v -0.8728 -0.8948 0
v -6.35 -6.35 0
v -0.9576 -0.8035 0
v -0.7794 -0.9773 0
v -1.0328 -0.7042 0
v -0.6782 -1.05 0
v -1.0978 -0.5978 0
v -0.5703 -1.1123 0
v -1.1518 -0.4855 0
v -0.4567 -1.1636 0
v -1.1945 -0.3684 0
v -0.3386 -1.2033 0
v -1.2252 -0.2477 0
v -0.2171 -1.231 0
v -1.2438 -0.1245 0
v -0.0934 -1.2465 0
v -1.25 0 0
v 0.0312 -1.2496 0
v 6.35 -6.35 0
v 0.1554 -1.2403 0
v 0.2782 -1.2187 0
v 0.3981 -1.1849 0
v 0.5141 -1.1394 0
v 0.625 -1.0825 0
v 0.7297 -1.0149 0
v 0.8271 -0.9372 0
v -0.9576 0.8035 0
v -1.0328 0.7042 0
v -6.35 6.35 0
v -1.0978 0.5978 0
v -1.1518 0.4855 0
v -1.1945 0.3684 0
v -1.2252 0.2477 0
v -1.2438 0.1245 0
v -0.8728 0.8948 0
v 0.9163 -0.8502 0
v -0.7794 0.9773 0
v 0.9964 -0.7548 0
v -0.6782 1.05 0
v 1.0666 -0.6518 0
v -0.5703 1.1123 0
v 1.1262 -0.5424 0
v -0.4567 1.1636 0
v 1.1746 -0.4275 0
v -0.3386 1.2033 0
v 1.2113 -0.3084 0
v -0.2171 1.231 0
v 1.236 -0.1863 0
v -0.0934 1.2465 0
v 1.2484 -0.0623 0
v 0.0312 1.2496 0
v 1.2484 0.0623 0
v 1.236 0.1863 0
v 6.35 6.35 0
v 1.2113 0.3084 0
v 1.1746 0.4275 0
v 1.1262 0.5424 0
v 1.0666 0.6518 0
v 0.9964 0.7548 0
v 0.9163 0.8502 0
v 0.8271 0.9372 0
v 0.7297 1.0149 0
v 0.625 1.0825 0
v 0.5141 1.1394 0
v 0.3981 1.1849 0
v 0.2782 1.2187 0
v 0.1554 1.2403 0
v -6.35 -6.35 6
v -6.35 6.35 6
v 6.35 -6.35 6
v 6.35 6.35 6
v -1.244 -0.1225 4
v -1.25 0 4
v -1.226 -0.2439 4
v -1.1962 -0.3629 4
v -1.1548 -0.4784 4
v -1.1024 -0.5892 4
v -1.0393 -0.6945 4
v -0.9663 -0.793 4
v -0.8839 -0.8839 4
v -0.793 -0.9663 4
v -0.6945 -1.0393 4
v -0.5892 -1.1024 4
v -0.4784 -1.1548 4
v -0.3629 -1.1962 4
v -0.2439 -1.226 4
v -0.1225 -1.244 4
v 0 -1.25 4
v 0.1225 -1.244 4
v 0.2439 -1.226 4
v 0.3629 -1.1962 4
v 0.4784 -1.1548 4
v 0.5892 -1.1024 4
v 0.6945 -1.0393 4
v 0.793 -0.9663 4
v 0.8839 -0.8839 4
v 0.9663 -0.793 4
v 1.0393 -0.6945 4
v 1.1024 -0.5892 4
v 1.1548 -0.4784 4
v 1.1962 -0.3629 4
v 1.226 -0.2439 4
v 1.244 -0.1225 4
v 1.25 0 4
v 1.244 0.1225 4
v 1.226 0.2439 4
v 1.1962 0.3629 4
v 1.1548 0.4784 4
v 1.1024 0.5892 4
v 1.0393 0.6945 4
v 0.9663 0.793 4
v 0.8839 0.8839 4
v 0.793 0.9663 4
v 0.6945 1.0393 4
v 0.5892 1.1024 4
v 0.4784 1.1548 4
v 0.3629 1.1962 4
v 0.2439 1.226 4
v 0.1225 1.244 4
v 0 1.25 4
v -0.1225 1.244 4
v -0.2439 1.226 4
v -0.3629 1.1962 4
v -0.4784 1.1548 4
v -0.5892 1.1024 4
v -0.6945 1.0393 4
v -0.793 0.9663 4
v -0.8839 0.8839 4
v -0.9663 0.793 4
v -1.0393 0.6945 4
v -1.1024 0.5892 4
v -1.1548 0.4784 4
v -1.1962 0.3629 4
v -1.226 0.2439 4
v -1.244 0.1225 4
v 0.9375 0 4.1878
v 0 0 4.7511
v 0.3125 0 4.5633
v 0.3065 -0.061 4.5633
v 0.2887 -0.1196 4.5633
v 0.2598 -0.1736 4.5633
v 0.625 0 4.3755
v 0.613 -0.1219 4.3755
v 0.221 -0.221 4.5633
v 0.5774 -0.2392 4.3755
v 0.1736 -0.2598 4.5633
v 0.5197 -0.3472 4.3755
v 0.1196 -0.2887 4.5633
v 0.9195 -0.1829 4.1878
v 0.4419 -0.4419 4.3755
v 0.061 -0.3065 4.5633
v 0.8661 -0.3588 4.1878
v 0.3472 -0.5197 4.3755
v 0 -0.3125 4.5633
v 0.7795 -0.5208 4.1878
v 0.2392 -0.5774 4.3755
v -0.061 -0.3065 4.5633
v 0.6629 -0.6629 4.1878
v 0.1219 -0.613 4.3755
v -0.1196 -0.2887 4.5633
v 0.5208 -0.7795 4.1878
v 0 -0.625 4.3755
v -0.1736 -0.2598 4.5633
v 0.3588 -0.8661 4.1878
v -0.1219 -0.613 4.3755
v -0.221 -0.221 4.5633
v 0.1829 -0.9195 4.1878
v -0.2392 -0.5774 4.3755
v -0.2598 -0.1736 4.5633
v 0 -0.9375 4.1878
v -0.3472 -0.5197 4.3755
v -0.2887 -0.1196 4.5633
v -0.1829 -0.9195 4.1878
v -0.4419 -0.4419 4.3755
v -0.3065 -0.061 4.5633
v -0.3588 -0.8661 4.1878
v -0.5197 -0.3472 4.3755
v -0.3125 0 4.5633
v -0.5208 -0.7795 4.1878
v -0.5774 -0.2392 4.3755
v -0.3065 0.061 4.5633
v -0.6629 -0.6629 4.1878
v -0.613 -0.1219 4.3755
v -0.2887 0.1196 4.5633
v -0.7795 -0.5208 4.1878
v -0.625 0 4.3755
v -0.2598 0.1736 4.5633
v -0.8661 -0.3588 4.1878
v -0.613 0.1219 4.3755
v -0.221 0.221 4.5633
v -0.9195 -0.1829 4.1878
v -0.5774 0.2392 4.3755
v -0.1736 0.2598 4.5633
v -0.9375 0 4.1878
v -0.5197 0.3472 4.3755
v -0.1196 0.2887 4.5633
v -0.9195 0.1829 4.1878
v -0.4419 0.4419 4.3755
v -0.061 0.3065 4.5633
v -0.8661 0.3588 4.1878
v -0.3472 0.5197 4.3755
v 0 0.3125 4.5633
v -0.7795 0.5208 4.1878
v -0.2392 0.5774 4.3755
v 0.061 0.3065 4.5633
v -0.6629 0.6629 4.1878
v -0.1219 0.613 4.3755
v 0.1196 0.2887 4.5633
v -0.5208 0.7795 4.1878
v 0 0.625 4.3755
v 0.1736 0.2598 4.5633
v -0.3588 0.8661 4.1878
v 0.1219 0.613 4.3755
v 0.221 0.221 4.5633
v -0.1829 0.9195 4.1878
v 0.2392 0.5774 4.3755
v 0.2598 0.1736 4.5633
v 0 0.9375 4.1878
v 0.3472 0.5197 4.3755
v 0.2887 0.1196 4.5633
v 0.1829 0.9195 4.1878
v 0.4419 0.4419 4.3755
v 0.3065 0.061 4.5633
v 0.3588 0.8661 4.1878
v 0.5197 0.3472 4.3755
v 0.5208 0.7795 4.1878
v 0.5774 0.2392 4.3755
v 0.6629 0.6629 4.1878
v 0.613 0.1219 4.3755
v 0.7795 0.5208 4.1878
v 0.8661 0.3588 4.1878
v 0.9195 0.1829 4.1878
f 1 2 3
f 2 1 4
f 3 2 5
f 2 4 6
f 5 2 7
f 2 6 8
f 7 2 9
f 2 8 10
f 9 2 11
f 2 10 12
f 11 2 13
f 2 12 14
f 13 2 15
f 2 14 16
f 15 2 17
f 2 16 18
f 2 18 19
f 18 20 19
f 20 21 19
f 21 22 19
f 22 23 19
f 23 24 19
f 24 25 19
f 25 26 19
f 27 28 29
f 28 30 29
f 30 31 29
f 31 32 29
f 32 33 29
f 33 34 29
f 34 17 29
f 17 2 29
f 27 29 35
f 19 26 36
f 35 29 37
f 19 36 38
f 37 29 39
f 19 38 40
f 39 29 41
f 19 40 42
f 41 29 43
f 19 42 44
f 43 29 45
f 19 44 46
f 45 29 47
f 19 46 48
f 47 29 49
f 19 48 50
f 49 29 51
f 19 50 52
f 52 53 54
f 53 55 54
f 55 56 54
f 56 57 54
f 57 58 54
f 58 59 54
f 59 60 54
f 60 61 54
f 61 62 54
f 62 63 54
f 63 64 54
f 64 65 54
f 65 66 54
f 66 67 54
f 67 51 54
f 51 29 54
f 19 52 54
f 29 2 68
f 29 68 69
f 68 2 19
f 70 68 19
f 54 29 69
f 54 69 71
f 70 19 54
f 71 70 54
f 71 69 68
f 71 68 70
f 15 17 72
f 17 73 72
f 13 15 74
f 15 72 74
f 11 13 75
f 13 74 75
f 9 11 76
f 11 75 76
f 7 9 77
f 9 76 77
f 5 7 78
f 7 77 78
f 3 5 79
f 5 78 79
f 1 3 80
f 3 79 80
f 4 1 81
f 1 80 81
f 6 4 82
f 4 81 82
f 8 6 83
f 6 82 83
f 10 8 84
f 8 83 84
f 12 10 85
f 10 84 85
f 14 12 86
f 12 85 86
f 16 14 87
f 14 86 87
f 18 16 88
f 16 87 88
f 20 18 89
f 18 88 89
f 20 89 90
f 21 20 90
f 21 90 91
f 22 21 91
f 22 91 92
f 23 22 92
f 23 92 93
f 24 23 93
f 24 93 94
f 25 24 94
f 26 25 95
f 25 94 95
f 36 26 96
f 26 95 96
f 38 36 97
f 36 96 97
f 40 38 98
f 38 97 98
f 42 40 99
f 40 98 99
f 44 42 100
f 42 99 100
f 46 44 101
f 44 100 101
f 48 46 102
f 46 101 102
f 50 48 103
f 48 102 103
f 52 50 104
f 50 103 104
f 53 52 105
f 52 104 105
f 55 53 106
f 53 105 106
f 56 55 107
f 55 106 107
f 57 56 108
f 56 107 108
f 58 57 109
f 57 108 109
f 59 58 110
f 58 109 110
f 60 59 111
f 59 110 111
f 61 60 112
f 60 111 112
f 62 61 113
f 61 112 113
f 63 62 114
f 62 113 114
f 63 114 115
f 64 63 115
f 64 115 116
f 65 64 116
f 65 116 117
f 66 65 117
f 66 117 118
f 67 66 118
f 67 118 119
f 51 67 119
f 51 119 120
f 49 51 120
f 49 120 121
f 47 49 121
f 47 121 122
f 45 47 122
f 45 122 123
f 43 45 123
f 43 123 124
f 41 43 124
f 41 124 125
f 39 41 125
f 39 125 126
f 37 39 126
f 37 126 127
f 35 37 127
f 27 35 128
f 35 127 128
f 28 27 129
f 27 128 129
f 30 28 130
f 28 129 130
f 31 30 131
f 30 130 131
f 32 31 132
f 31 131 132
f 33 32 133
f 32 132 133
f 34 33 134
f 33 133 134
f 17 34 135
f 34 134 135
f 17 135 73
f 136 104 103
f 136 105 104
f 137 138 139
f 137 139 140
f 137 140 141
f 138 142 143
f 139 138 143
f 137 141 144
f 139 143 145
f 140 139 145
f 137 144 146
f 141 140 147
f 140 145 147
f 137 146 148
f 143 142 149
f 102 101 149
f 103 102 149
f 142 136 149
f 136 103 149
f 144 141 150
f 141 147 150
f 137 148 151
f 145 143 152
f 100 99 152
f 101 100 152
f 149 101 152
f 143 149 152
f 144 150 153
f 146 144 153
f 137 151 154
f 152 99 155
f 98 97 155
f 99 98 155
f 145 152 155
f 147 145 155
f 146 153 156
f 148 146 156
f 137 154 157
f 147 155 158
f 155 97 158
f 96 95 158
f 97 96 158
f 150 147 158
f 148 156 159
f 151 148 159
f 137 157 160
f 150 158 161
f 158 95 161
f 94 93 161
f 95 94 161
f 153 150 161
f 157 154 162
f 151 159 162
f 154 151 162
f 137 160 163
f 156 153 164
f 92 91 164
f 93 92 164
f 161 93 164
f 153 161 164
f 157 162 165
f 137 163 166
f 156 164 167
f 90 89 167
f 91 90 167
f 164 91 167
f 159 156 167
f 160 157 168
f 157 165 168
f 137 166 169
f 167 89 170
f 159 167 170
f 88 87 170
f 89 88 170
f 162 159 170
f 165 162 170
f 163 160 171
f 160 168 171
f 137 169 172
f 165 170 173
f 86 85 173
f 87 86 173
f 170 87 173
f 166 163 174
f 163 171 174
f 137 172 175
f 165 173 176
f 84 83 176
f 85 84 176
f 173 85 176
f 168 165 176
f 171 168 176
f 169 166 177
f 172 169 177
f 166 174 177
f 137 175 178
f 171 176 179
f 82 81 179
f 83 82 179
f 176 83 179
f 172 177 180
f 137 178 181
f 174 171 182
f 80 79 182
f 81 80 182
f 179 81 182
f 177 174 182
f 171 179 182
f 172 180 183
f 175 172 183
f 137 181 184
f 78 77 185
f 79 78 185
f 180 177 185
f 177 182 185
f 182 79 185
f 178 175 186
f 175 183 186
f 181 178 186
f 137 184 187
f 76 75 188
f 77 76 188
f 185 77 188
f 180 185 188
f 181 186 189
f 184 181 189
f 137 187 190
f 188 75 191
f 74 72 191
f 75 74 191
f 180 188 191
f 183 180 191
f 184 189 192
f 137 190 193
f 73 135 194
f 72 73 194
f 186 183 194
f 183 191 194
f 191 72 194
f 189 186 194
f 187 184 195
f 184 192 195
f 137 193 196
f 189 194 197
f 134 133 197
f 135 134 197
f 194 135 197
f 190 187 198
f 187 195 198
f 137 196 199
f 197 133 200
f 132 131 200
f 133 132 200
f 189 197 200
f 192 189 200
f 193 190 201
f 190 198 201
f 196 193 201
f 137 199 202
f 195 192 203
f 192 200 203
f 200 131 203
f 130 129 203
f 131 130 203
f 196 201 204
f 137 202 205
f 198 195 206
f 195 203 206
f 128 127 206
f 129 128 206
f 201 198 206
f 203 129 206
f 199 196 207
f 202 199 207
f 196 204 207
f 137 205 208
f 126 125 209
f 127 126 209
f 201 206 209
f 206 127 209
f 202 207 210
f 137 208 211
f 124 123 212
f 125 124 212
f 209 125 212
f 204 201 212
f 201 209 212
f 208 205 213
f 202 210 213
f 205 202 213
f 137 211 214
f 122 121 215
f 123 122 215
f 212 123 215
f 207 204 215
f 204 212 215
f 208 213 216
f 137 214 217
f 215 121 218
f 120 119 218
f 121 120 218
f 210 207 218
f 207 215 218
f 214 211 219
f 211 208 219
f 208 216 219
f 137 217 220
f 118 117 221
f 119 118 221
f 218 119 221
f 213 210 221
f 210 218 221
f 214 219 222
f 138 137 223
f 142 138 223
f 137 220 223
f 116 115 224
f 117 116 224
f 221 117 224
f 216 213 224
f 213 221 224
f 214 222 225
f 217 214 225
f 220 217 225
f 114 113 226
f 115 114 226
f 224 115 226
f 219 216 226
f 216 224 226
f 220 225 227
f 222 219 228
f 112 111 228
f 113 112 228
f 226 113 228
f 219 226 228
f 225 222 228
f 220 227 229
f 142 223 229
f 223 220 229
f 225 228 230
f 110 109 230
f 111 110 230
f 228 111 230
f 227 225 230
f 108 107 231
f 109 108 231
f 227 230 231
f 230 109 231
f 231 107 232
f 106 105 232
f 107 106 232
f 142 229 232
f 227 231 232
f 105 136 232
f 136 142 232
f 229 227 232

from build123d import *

# Parameters (mm, degrees)
SKETCH1_W                       = 12.7
SKETCH1_H                       = 12.7
BOSS_EXTRUDE1_DEPTH             = 6
TAP_DRILL_FOR_M3X0_5_TAP3_D     = 2.5
TAP_DRILL_FOR_M3X0_5_TAP3_DEPTH = 4
TAP_DRILL_FOR_M3X0_5_TAP3_TIP   = 0.751075774


with BuildPart() as part:
    # Sketch1 → Boss-Extrude1 (new body)
    with BuildSketch(Plane.XY):
        Rectangle(SKETCH1_W, SKETCH1_H)
    extrude(amount=BOSS_EXTRUDE1_DEPTH)

    # Tap Drill for M3x0.5 Tap3
    with Locations(Plane(origin=(0, 0, 0), x_dir=(1, 0, 0), z_dir=(0, 0, -1))):
        with Locations((0, 0)):
            Hole(TAP_DRILL_FOR_M3X0_5_TAP3_D / 2, depth=TAP_DRILL_FOR_M3X0_5_TAP3_DEPTH)
            with Locations((0, 0, -(TAP_DRILL_FOR_M3X0_5_TAP3_DEPTH + TAP_DRILL_FOR_M3X0_5_TAP3_TIP / 2))):  # 118° drill point
                Cone(0, TAP_DRILL_FOR_M3X0_5_TAP3_D / 2, TAP_DRILL_FOR_M3X0_5_TAP3_TIP, mode=Mode.SUBTRACT)


solid = part.part
